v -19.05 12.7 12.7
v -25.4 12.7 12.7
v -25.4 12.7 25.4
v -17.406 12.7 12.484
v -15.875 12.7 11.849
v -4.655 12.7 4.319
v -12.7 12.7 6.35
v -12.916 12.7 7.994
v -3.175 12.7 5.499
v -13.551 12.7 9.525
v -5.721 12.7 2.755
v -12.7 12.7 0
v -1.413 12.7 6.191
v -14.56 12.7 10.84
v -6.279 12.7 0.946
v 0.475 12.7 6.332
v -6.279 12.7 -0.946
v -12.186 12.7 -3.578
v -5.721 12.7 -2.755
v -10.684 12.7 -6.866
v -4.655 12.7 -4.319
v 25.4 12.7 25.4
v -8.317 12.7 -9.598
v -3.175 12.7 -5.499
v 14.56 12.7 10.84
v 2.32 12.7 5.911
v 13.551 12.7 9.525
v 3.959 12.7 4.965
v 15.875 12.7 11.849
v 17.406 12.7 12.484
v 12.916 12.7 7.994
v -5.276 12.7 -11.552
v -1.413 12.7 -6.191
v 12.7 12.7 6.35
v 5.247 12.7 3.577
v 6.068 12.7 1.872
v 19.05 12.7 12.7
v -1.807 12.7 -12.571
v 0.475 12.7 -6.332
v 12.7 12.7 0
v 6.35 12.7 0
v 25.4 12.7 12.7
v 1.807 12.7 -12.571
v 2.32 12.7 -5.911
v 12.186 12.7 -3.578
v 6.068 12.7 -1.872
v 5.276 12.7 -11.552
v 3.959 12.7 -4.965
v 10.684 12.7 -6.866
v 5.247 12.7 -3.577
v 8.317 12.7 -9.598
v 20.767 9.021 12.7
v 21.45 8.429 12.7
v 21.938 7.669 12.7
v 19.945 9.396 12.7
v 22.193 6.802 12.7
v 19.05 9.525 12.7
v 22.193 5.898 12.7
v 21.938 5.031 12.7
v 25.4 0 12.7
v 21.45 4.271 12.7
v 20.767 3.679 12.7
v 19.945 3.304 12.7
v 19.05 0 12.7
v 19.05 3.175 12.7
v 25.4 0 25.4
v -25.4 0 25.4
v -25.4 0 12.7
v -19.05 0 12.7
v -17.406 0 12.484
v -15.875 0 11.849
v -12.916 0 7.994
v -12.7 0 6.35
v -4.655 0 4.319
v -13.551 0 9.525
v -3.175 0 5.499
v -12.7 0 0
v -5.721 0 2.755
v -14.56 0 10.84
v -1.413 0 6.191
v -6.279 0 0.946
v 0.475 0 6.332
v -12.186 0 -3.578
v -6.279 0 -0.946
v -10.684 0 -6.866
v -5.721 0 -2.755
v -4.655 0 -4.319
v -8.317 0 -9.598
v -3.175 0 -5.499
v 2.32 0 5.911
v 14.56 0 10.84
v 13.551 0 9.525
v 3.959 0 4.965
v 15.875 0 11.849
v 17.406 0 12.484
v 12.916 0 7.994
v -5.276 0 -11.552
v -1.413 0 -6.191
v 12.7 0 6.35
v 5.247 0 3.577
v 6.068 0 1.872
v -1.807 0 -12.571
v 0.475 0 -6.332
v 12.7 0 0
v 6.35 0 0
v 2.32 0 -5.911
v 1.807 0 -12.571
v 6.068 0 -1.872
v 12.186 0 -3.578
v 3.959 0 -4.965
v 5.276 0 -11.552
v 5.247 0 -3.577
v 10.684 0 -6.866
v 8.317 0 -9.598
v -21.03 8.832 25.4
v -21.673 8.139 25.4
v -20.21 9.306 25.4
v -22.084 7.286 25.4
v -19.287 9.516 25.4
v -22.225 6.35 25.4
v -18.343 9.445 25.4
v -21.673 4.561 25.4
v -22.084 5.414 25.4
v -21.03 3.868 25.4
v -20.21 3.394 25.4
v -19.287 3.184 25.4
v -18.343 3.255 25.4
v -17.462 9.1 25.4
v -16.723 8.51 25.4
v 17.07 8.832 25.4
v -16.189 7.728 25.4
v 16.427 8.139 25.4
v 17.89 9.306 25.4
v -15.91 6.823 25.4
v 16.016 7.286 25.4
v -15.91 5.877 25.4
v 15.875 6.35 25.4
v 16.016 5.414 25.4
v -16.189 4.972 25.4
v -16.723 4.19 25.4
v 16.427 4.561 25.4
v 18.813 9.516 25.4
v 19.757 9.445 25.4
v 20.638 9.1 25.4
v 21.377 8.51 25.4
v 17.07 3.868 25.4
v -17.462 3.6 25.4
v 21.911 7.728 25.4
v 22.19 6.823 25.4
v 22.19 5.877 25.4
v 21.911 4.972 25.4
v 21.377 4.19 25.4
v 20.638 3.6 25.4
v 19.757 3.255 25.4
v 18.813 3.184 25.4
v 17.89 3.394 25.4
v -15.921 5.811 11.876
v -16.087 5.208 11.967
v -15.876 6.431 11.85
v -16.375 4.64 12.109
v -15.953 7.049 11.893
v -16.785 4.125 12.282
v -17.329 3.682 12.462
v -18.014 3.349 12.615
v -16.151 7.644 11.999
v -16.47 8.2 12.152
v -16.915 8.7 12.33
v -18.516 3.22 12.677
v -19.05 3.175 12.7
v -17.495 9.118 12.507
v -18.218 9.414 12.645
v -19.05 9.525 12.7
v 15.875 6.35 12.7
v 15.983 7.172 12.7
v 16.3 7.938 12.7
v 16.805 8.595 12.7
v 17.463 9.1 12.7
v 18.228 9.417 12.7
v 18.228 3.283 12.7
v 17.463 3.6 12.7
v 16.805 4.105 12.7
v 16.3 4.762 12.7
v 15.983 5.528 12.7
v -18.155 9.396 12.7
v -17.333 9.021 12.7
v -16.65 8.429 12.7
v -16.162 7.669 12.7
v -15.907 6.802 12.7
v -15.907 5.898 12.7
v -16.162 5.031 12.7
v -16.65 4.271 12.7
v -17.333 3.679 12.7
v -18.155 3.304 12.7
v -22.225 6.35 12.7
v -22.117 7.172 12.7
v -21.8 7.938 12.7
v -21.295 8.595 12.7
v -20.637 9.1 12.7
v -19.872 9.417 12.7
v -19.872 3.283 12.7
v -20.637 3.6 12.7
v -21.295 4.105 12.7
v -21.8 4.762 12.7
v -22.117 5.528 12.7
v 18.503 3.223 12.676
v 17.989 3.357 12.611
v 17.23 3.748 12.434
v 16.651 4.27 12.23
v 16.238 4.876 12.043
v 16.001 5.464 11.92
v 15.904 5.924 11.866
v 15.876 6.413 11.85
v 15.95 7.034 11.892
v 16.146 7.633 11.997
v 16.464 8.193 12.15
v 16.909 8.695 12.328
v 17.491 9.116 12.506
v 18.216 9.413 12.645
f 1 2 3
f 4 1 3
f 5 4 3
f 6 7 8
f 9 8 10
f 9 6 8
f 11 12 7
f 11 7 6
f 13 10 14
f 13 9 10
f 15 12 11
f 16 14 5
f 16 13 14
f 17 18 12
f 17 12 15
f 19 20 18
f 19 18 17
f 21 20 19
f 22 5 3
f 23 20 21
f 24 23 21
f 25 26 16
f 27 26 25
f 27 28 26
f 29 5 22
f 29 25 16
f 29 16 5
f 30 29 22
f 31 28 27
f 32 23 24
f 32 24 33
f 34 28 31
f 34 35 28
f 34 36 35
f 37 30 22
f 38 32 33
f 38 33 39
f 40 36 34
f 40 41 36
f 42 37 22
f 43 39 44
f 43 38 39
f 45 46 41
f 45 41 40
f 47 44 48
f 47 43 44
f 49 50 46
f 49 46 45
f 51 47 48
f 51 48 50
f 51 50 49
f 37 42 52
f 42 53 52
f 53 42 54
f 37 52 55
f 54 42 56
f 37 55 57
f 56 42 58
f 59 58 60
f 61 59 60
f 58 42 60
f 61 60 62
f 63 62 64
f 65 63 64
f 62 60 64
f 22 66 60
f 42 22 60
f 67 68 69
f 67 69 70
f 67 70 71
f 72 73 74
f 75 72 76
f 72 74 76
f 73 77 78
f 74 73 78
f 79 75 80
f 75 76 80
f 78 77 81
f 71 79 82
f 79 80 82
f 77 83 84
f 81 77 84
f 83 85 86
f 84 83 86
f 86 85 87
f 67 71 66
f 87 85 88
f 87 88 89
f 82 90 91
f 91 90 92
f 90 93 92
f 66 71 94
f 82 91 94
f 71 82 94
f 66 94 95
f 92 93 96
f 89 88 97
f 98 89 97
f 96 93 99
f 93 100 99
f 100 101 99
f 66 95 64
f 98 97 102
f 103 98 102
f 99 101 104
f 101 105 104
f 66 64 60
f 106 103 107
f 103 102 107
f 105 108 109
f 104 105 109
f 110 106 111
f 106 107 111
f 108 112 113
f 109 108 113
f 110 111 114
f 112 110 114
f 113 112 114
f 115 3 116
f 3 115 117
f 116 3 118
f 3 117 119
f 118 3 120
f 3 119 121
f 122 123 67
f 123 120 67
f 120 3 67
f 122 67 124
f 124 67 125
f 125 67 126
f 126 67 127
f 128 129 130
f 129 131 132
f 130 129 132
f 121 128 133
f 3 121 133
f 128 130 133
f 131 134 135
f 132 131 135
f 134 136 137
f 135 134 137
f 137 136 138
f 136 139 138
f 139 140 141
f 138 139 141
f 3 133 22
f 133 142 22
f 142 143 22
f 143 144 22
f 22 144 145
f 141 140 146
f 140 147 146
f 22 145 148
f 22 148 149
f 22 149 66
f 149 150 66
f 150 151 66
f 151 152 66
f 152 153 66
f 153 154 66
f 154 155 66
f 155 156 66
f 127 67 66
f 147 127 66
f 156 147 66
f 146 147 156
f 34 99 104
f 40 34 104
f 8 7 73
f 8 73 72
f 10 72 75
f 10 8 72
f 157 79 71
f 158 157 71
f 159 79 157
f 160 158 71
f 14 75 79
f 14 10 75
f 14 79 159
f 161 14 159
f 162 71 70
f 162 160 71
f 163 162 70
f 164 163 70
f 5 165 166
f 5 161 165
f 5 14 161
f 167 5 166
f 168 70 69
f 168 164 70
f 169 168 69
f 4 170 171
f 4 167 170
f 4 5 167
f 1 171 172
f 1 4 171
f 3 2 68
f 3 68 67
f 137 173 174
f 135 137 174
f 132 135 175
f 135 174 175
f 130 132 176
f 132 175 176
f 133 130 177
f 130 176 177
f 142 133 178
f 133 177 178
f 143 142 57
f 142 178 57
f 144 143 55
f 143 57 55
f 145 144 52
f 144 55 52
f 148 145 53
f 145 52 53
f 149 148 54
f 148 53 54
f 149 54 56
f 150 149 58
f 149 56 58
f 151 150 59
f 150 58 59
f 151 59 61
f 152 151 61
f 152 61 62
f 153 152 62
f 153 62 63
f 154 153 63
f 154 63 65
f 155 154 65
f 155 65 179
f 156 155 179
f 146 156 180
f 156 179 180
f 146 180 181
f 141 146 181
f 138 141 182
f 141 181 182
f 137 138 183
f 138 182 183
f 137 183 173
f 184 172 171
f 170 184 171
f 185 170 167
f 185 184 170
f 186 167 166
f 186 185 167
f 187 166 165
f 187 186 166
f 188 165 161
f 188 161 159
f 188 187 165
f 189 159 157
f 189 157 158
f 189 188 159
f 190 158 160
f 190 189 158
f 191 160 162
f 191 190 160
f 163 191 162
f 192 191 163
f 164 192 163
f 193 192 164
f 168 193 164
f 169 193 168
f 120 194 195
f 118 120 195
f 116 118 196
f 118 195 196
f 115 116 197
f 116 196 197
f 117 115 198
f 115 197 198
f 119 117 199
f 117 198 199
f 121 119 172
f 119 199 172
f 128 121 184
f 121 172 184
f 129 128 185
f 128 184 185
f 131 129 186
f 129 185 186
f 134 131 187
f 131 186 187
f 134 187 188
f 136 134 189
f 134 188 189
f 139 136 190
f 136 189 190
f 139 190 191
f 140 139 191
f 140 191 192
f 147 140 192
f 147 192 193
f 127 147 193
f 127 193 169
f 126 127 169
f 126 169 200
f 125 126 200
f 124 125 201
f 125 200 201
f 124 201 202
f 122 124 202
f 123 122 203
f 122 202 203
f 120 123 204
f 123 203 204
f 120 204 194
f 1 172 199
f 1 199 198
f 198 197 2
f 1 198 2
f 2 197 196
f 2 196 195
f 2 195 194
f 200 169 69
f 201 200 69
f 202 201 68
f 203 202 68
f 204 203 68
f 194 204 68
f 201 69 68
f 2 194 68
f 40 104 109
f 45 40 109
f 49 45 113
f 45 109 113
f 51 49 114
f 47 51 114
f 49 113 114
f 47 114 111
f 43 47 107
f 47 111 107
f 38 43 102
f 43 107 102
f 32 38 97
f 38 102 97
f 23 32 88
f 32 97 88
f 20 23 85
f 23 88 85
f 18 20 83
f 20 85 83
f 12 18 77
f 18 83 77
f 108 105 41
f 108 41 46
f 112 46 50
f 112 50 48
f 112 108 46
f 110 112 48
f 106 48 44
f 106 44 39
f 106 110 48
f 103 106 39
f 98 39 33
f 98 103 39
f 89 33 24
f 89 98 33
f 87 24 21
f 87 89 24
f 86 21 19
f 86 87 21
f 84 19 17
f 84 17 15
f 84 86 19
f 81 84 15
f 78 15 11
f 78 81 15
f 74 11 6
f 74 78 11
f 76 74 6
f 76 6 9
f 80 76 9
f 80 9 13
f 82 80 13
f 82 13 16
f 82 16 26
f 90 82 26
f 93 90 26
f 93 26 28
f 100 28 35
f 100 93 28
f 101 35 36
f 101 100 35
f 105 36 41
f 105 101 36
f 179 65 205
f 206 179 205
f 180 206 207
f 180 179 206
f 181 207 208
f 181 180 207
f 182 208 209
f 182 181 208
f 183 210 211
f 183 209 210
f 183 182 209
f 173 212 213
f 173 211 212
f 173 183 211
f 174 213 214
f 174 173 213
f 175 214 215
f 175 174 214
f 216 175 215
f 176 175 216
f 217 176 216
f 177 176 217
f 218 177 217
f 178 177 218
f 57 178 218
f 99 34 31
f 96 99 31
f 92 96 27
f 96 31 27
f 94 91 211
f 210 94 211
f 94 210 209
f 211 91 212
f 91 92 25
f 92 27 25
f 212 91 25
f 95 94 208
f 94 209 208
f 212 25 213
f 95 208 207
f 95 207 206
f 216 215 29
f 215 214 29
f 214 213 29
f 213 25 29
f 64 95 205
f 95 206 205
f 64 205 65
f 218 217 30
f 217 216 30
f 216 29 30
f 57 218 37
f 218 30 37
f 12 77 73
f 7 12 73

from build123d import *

# Parameters (mm, degrees)
SKETCH1_R               = 6.35
BOSS_EXTRUDE1_DEPTH     = 12.7
FILLET1_R               = 6.35
SKETCH2_R               = 3.175
CUT_EXTRUDE1_DEPTH      = 26.4
CUT_EXTRUDE1_DEPTH_BACK = 13.7


with BuildPart() as part:
    # Sketch1 → Boss-Extrude1 (new body)
    with BuildSketch(Plane(origin=(0, 0, 0), x_dir=(1, 0, 0), z_dir=(0, 1, 0))):
        with BuildLine():
            Line((-12.7, 0), (-12.7, -12.7))
            Line((-12.7, -12.7), (-25.4, -12.7))
            Line((-25.4, -12.7), (-25.4, -25.4))
            Line((-25.4, -25.4), (25.4, -25.4))
            Line((25.4, -25.4), (25.4, -12.7))
            Line((25.4, -12.7), (12.7, -12.7))
            Line((12.7, -12.7), (12.7, 0))
            ThreePointArc((12.7, 0), (0, 12.7), (-12.7, 0))
        make_face()
        Circle(SKETCH1_R, mode=Mode.SUBTRACT)
    extrude(amount=BOSS_EXTRUDE1_DEPTH)

    # Fillet1
    fillet1_edges = [part.edges().sort_by_distance(p)[0] for p in [
        (12.7, 6.35, 12.7),
        (-12.7, 6.35, 12.7),
    ]]
    fillet(fillet1_edges, radius=FILLET1_R)

    # Sketch2 → Cut-Extrude1 (cut, two sides)
    with BuildSketch(Plane(origin=(0, 0, 12.7), x_dir=(-1, 0, 0), z_dir=(0, 0, -1))) as cut_extrude1_sk:
        with Locations((19.05, 6.35)):
            Circle(SKETCH2_R)
        with Locations((-19.05, 6.35)):
            Circle(SKETCH2_R)
    extrude(amount=CUT_EXTRUDE1_DEPTH, mode=Mode.SUBTRACT)
    extrude(cut_extrude1_sk.sketch, amount=-CUT_EXTRUDE1_DEPTH_BACK, mode=Mode.SUBTRACT)


solid = part.part
